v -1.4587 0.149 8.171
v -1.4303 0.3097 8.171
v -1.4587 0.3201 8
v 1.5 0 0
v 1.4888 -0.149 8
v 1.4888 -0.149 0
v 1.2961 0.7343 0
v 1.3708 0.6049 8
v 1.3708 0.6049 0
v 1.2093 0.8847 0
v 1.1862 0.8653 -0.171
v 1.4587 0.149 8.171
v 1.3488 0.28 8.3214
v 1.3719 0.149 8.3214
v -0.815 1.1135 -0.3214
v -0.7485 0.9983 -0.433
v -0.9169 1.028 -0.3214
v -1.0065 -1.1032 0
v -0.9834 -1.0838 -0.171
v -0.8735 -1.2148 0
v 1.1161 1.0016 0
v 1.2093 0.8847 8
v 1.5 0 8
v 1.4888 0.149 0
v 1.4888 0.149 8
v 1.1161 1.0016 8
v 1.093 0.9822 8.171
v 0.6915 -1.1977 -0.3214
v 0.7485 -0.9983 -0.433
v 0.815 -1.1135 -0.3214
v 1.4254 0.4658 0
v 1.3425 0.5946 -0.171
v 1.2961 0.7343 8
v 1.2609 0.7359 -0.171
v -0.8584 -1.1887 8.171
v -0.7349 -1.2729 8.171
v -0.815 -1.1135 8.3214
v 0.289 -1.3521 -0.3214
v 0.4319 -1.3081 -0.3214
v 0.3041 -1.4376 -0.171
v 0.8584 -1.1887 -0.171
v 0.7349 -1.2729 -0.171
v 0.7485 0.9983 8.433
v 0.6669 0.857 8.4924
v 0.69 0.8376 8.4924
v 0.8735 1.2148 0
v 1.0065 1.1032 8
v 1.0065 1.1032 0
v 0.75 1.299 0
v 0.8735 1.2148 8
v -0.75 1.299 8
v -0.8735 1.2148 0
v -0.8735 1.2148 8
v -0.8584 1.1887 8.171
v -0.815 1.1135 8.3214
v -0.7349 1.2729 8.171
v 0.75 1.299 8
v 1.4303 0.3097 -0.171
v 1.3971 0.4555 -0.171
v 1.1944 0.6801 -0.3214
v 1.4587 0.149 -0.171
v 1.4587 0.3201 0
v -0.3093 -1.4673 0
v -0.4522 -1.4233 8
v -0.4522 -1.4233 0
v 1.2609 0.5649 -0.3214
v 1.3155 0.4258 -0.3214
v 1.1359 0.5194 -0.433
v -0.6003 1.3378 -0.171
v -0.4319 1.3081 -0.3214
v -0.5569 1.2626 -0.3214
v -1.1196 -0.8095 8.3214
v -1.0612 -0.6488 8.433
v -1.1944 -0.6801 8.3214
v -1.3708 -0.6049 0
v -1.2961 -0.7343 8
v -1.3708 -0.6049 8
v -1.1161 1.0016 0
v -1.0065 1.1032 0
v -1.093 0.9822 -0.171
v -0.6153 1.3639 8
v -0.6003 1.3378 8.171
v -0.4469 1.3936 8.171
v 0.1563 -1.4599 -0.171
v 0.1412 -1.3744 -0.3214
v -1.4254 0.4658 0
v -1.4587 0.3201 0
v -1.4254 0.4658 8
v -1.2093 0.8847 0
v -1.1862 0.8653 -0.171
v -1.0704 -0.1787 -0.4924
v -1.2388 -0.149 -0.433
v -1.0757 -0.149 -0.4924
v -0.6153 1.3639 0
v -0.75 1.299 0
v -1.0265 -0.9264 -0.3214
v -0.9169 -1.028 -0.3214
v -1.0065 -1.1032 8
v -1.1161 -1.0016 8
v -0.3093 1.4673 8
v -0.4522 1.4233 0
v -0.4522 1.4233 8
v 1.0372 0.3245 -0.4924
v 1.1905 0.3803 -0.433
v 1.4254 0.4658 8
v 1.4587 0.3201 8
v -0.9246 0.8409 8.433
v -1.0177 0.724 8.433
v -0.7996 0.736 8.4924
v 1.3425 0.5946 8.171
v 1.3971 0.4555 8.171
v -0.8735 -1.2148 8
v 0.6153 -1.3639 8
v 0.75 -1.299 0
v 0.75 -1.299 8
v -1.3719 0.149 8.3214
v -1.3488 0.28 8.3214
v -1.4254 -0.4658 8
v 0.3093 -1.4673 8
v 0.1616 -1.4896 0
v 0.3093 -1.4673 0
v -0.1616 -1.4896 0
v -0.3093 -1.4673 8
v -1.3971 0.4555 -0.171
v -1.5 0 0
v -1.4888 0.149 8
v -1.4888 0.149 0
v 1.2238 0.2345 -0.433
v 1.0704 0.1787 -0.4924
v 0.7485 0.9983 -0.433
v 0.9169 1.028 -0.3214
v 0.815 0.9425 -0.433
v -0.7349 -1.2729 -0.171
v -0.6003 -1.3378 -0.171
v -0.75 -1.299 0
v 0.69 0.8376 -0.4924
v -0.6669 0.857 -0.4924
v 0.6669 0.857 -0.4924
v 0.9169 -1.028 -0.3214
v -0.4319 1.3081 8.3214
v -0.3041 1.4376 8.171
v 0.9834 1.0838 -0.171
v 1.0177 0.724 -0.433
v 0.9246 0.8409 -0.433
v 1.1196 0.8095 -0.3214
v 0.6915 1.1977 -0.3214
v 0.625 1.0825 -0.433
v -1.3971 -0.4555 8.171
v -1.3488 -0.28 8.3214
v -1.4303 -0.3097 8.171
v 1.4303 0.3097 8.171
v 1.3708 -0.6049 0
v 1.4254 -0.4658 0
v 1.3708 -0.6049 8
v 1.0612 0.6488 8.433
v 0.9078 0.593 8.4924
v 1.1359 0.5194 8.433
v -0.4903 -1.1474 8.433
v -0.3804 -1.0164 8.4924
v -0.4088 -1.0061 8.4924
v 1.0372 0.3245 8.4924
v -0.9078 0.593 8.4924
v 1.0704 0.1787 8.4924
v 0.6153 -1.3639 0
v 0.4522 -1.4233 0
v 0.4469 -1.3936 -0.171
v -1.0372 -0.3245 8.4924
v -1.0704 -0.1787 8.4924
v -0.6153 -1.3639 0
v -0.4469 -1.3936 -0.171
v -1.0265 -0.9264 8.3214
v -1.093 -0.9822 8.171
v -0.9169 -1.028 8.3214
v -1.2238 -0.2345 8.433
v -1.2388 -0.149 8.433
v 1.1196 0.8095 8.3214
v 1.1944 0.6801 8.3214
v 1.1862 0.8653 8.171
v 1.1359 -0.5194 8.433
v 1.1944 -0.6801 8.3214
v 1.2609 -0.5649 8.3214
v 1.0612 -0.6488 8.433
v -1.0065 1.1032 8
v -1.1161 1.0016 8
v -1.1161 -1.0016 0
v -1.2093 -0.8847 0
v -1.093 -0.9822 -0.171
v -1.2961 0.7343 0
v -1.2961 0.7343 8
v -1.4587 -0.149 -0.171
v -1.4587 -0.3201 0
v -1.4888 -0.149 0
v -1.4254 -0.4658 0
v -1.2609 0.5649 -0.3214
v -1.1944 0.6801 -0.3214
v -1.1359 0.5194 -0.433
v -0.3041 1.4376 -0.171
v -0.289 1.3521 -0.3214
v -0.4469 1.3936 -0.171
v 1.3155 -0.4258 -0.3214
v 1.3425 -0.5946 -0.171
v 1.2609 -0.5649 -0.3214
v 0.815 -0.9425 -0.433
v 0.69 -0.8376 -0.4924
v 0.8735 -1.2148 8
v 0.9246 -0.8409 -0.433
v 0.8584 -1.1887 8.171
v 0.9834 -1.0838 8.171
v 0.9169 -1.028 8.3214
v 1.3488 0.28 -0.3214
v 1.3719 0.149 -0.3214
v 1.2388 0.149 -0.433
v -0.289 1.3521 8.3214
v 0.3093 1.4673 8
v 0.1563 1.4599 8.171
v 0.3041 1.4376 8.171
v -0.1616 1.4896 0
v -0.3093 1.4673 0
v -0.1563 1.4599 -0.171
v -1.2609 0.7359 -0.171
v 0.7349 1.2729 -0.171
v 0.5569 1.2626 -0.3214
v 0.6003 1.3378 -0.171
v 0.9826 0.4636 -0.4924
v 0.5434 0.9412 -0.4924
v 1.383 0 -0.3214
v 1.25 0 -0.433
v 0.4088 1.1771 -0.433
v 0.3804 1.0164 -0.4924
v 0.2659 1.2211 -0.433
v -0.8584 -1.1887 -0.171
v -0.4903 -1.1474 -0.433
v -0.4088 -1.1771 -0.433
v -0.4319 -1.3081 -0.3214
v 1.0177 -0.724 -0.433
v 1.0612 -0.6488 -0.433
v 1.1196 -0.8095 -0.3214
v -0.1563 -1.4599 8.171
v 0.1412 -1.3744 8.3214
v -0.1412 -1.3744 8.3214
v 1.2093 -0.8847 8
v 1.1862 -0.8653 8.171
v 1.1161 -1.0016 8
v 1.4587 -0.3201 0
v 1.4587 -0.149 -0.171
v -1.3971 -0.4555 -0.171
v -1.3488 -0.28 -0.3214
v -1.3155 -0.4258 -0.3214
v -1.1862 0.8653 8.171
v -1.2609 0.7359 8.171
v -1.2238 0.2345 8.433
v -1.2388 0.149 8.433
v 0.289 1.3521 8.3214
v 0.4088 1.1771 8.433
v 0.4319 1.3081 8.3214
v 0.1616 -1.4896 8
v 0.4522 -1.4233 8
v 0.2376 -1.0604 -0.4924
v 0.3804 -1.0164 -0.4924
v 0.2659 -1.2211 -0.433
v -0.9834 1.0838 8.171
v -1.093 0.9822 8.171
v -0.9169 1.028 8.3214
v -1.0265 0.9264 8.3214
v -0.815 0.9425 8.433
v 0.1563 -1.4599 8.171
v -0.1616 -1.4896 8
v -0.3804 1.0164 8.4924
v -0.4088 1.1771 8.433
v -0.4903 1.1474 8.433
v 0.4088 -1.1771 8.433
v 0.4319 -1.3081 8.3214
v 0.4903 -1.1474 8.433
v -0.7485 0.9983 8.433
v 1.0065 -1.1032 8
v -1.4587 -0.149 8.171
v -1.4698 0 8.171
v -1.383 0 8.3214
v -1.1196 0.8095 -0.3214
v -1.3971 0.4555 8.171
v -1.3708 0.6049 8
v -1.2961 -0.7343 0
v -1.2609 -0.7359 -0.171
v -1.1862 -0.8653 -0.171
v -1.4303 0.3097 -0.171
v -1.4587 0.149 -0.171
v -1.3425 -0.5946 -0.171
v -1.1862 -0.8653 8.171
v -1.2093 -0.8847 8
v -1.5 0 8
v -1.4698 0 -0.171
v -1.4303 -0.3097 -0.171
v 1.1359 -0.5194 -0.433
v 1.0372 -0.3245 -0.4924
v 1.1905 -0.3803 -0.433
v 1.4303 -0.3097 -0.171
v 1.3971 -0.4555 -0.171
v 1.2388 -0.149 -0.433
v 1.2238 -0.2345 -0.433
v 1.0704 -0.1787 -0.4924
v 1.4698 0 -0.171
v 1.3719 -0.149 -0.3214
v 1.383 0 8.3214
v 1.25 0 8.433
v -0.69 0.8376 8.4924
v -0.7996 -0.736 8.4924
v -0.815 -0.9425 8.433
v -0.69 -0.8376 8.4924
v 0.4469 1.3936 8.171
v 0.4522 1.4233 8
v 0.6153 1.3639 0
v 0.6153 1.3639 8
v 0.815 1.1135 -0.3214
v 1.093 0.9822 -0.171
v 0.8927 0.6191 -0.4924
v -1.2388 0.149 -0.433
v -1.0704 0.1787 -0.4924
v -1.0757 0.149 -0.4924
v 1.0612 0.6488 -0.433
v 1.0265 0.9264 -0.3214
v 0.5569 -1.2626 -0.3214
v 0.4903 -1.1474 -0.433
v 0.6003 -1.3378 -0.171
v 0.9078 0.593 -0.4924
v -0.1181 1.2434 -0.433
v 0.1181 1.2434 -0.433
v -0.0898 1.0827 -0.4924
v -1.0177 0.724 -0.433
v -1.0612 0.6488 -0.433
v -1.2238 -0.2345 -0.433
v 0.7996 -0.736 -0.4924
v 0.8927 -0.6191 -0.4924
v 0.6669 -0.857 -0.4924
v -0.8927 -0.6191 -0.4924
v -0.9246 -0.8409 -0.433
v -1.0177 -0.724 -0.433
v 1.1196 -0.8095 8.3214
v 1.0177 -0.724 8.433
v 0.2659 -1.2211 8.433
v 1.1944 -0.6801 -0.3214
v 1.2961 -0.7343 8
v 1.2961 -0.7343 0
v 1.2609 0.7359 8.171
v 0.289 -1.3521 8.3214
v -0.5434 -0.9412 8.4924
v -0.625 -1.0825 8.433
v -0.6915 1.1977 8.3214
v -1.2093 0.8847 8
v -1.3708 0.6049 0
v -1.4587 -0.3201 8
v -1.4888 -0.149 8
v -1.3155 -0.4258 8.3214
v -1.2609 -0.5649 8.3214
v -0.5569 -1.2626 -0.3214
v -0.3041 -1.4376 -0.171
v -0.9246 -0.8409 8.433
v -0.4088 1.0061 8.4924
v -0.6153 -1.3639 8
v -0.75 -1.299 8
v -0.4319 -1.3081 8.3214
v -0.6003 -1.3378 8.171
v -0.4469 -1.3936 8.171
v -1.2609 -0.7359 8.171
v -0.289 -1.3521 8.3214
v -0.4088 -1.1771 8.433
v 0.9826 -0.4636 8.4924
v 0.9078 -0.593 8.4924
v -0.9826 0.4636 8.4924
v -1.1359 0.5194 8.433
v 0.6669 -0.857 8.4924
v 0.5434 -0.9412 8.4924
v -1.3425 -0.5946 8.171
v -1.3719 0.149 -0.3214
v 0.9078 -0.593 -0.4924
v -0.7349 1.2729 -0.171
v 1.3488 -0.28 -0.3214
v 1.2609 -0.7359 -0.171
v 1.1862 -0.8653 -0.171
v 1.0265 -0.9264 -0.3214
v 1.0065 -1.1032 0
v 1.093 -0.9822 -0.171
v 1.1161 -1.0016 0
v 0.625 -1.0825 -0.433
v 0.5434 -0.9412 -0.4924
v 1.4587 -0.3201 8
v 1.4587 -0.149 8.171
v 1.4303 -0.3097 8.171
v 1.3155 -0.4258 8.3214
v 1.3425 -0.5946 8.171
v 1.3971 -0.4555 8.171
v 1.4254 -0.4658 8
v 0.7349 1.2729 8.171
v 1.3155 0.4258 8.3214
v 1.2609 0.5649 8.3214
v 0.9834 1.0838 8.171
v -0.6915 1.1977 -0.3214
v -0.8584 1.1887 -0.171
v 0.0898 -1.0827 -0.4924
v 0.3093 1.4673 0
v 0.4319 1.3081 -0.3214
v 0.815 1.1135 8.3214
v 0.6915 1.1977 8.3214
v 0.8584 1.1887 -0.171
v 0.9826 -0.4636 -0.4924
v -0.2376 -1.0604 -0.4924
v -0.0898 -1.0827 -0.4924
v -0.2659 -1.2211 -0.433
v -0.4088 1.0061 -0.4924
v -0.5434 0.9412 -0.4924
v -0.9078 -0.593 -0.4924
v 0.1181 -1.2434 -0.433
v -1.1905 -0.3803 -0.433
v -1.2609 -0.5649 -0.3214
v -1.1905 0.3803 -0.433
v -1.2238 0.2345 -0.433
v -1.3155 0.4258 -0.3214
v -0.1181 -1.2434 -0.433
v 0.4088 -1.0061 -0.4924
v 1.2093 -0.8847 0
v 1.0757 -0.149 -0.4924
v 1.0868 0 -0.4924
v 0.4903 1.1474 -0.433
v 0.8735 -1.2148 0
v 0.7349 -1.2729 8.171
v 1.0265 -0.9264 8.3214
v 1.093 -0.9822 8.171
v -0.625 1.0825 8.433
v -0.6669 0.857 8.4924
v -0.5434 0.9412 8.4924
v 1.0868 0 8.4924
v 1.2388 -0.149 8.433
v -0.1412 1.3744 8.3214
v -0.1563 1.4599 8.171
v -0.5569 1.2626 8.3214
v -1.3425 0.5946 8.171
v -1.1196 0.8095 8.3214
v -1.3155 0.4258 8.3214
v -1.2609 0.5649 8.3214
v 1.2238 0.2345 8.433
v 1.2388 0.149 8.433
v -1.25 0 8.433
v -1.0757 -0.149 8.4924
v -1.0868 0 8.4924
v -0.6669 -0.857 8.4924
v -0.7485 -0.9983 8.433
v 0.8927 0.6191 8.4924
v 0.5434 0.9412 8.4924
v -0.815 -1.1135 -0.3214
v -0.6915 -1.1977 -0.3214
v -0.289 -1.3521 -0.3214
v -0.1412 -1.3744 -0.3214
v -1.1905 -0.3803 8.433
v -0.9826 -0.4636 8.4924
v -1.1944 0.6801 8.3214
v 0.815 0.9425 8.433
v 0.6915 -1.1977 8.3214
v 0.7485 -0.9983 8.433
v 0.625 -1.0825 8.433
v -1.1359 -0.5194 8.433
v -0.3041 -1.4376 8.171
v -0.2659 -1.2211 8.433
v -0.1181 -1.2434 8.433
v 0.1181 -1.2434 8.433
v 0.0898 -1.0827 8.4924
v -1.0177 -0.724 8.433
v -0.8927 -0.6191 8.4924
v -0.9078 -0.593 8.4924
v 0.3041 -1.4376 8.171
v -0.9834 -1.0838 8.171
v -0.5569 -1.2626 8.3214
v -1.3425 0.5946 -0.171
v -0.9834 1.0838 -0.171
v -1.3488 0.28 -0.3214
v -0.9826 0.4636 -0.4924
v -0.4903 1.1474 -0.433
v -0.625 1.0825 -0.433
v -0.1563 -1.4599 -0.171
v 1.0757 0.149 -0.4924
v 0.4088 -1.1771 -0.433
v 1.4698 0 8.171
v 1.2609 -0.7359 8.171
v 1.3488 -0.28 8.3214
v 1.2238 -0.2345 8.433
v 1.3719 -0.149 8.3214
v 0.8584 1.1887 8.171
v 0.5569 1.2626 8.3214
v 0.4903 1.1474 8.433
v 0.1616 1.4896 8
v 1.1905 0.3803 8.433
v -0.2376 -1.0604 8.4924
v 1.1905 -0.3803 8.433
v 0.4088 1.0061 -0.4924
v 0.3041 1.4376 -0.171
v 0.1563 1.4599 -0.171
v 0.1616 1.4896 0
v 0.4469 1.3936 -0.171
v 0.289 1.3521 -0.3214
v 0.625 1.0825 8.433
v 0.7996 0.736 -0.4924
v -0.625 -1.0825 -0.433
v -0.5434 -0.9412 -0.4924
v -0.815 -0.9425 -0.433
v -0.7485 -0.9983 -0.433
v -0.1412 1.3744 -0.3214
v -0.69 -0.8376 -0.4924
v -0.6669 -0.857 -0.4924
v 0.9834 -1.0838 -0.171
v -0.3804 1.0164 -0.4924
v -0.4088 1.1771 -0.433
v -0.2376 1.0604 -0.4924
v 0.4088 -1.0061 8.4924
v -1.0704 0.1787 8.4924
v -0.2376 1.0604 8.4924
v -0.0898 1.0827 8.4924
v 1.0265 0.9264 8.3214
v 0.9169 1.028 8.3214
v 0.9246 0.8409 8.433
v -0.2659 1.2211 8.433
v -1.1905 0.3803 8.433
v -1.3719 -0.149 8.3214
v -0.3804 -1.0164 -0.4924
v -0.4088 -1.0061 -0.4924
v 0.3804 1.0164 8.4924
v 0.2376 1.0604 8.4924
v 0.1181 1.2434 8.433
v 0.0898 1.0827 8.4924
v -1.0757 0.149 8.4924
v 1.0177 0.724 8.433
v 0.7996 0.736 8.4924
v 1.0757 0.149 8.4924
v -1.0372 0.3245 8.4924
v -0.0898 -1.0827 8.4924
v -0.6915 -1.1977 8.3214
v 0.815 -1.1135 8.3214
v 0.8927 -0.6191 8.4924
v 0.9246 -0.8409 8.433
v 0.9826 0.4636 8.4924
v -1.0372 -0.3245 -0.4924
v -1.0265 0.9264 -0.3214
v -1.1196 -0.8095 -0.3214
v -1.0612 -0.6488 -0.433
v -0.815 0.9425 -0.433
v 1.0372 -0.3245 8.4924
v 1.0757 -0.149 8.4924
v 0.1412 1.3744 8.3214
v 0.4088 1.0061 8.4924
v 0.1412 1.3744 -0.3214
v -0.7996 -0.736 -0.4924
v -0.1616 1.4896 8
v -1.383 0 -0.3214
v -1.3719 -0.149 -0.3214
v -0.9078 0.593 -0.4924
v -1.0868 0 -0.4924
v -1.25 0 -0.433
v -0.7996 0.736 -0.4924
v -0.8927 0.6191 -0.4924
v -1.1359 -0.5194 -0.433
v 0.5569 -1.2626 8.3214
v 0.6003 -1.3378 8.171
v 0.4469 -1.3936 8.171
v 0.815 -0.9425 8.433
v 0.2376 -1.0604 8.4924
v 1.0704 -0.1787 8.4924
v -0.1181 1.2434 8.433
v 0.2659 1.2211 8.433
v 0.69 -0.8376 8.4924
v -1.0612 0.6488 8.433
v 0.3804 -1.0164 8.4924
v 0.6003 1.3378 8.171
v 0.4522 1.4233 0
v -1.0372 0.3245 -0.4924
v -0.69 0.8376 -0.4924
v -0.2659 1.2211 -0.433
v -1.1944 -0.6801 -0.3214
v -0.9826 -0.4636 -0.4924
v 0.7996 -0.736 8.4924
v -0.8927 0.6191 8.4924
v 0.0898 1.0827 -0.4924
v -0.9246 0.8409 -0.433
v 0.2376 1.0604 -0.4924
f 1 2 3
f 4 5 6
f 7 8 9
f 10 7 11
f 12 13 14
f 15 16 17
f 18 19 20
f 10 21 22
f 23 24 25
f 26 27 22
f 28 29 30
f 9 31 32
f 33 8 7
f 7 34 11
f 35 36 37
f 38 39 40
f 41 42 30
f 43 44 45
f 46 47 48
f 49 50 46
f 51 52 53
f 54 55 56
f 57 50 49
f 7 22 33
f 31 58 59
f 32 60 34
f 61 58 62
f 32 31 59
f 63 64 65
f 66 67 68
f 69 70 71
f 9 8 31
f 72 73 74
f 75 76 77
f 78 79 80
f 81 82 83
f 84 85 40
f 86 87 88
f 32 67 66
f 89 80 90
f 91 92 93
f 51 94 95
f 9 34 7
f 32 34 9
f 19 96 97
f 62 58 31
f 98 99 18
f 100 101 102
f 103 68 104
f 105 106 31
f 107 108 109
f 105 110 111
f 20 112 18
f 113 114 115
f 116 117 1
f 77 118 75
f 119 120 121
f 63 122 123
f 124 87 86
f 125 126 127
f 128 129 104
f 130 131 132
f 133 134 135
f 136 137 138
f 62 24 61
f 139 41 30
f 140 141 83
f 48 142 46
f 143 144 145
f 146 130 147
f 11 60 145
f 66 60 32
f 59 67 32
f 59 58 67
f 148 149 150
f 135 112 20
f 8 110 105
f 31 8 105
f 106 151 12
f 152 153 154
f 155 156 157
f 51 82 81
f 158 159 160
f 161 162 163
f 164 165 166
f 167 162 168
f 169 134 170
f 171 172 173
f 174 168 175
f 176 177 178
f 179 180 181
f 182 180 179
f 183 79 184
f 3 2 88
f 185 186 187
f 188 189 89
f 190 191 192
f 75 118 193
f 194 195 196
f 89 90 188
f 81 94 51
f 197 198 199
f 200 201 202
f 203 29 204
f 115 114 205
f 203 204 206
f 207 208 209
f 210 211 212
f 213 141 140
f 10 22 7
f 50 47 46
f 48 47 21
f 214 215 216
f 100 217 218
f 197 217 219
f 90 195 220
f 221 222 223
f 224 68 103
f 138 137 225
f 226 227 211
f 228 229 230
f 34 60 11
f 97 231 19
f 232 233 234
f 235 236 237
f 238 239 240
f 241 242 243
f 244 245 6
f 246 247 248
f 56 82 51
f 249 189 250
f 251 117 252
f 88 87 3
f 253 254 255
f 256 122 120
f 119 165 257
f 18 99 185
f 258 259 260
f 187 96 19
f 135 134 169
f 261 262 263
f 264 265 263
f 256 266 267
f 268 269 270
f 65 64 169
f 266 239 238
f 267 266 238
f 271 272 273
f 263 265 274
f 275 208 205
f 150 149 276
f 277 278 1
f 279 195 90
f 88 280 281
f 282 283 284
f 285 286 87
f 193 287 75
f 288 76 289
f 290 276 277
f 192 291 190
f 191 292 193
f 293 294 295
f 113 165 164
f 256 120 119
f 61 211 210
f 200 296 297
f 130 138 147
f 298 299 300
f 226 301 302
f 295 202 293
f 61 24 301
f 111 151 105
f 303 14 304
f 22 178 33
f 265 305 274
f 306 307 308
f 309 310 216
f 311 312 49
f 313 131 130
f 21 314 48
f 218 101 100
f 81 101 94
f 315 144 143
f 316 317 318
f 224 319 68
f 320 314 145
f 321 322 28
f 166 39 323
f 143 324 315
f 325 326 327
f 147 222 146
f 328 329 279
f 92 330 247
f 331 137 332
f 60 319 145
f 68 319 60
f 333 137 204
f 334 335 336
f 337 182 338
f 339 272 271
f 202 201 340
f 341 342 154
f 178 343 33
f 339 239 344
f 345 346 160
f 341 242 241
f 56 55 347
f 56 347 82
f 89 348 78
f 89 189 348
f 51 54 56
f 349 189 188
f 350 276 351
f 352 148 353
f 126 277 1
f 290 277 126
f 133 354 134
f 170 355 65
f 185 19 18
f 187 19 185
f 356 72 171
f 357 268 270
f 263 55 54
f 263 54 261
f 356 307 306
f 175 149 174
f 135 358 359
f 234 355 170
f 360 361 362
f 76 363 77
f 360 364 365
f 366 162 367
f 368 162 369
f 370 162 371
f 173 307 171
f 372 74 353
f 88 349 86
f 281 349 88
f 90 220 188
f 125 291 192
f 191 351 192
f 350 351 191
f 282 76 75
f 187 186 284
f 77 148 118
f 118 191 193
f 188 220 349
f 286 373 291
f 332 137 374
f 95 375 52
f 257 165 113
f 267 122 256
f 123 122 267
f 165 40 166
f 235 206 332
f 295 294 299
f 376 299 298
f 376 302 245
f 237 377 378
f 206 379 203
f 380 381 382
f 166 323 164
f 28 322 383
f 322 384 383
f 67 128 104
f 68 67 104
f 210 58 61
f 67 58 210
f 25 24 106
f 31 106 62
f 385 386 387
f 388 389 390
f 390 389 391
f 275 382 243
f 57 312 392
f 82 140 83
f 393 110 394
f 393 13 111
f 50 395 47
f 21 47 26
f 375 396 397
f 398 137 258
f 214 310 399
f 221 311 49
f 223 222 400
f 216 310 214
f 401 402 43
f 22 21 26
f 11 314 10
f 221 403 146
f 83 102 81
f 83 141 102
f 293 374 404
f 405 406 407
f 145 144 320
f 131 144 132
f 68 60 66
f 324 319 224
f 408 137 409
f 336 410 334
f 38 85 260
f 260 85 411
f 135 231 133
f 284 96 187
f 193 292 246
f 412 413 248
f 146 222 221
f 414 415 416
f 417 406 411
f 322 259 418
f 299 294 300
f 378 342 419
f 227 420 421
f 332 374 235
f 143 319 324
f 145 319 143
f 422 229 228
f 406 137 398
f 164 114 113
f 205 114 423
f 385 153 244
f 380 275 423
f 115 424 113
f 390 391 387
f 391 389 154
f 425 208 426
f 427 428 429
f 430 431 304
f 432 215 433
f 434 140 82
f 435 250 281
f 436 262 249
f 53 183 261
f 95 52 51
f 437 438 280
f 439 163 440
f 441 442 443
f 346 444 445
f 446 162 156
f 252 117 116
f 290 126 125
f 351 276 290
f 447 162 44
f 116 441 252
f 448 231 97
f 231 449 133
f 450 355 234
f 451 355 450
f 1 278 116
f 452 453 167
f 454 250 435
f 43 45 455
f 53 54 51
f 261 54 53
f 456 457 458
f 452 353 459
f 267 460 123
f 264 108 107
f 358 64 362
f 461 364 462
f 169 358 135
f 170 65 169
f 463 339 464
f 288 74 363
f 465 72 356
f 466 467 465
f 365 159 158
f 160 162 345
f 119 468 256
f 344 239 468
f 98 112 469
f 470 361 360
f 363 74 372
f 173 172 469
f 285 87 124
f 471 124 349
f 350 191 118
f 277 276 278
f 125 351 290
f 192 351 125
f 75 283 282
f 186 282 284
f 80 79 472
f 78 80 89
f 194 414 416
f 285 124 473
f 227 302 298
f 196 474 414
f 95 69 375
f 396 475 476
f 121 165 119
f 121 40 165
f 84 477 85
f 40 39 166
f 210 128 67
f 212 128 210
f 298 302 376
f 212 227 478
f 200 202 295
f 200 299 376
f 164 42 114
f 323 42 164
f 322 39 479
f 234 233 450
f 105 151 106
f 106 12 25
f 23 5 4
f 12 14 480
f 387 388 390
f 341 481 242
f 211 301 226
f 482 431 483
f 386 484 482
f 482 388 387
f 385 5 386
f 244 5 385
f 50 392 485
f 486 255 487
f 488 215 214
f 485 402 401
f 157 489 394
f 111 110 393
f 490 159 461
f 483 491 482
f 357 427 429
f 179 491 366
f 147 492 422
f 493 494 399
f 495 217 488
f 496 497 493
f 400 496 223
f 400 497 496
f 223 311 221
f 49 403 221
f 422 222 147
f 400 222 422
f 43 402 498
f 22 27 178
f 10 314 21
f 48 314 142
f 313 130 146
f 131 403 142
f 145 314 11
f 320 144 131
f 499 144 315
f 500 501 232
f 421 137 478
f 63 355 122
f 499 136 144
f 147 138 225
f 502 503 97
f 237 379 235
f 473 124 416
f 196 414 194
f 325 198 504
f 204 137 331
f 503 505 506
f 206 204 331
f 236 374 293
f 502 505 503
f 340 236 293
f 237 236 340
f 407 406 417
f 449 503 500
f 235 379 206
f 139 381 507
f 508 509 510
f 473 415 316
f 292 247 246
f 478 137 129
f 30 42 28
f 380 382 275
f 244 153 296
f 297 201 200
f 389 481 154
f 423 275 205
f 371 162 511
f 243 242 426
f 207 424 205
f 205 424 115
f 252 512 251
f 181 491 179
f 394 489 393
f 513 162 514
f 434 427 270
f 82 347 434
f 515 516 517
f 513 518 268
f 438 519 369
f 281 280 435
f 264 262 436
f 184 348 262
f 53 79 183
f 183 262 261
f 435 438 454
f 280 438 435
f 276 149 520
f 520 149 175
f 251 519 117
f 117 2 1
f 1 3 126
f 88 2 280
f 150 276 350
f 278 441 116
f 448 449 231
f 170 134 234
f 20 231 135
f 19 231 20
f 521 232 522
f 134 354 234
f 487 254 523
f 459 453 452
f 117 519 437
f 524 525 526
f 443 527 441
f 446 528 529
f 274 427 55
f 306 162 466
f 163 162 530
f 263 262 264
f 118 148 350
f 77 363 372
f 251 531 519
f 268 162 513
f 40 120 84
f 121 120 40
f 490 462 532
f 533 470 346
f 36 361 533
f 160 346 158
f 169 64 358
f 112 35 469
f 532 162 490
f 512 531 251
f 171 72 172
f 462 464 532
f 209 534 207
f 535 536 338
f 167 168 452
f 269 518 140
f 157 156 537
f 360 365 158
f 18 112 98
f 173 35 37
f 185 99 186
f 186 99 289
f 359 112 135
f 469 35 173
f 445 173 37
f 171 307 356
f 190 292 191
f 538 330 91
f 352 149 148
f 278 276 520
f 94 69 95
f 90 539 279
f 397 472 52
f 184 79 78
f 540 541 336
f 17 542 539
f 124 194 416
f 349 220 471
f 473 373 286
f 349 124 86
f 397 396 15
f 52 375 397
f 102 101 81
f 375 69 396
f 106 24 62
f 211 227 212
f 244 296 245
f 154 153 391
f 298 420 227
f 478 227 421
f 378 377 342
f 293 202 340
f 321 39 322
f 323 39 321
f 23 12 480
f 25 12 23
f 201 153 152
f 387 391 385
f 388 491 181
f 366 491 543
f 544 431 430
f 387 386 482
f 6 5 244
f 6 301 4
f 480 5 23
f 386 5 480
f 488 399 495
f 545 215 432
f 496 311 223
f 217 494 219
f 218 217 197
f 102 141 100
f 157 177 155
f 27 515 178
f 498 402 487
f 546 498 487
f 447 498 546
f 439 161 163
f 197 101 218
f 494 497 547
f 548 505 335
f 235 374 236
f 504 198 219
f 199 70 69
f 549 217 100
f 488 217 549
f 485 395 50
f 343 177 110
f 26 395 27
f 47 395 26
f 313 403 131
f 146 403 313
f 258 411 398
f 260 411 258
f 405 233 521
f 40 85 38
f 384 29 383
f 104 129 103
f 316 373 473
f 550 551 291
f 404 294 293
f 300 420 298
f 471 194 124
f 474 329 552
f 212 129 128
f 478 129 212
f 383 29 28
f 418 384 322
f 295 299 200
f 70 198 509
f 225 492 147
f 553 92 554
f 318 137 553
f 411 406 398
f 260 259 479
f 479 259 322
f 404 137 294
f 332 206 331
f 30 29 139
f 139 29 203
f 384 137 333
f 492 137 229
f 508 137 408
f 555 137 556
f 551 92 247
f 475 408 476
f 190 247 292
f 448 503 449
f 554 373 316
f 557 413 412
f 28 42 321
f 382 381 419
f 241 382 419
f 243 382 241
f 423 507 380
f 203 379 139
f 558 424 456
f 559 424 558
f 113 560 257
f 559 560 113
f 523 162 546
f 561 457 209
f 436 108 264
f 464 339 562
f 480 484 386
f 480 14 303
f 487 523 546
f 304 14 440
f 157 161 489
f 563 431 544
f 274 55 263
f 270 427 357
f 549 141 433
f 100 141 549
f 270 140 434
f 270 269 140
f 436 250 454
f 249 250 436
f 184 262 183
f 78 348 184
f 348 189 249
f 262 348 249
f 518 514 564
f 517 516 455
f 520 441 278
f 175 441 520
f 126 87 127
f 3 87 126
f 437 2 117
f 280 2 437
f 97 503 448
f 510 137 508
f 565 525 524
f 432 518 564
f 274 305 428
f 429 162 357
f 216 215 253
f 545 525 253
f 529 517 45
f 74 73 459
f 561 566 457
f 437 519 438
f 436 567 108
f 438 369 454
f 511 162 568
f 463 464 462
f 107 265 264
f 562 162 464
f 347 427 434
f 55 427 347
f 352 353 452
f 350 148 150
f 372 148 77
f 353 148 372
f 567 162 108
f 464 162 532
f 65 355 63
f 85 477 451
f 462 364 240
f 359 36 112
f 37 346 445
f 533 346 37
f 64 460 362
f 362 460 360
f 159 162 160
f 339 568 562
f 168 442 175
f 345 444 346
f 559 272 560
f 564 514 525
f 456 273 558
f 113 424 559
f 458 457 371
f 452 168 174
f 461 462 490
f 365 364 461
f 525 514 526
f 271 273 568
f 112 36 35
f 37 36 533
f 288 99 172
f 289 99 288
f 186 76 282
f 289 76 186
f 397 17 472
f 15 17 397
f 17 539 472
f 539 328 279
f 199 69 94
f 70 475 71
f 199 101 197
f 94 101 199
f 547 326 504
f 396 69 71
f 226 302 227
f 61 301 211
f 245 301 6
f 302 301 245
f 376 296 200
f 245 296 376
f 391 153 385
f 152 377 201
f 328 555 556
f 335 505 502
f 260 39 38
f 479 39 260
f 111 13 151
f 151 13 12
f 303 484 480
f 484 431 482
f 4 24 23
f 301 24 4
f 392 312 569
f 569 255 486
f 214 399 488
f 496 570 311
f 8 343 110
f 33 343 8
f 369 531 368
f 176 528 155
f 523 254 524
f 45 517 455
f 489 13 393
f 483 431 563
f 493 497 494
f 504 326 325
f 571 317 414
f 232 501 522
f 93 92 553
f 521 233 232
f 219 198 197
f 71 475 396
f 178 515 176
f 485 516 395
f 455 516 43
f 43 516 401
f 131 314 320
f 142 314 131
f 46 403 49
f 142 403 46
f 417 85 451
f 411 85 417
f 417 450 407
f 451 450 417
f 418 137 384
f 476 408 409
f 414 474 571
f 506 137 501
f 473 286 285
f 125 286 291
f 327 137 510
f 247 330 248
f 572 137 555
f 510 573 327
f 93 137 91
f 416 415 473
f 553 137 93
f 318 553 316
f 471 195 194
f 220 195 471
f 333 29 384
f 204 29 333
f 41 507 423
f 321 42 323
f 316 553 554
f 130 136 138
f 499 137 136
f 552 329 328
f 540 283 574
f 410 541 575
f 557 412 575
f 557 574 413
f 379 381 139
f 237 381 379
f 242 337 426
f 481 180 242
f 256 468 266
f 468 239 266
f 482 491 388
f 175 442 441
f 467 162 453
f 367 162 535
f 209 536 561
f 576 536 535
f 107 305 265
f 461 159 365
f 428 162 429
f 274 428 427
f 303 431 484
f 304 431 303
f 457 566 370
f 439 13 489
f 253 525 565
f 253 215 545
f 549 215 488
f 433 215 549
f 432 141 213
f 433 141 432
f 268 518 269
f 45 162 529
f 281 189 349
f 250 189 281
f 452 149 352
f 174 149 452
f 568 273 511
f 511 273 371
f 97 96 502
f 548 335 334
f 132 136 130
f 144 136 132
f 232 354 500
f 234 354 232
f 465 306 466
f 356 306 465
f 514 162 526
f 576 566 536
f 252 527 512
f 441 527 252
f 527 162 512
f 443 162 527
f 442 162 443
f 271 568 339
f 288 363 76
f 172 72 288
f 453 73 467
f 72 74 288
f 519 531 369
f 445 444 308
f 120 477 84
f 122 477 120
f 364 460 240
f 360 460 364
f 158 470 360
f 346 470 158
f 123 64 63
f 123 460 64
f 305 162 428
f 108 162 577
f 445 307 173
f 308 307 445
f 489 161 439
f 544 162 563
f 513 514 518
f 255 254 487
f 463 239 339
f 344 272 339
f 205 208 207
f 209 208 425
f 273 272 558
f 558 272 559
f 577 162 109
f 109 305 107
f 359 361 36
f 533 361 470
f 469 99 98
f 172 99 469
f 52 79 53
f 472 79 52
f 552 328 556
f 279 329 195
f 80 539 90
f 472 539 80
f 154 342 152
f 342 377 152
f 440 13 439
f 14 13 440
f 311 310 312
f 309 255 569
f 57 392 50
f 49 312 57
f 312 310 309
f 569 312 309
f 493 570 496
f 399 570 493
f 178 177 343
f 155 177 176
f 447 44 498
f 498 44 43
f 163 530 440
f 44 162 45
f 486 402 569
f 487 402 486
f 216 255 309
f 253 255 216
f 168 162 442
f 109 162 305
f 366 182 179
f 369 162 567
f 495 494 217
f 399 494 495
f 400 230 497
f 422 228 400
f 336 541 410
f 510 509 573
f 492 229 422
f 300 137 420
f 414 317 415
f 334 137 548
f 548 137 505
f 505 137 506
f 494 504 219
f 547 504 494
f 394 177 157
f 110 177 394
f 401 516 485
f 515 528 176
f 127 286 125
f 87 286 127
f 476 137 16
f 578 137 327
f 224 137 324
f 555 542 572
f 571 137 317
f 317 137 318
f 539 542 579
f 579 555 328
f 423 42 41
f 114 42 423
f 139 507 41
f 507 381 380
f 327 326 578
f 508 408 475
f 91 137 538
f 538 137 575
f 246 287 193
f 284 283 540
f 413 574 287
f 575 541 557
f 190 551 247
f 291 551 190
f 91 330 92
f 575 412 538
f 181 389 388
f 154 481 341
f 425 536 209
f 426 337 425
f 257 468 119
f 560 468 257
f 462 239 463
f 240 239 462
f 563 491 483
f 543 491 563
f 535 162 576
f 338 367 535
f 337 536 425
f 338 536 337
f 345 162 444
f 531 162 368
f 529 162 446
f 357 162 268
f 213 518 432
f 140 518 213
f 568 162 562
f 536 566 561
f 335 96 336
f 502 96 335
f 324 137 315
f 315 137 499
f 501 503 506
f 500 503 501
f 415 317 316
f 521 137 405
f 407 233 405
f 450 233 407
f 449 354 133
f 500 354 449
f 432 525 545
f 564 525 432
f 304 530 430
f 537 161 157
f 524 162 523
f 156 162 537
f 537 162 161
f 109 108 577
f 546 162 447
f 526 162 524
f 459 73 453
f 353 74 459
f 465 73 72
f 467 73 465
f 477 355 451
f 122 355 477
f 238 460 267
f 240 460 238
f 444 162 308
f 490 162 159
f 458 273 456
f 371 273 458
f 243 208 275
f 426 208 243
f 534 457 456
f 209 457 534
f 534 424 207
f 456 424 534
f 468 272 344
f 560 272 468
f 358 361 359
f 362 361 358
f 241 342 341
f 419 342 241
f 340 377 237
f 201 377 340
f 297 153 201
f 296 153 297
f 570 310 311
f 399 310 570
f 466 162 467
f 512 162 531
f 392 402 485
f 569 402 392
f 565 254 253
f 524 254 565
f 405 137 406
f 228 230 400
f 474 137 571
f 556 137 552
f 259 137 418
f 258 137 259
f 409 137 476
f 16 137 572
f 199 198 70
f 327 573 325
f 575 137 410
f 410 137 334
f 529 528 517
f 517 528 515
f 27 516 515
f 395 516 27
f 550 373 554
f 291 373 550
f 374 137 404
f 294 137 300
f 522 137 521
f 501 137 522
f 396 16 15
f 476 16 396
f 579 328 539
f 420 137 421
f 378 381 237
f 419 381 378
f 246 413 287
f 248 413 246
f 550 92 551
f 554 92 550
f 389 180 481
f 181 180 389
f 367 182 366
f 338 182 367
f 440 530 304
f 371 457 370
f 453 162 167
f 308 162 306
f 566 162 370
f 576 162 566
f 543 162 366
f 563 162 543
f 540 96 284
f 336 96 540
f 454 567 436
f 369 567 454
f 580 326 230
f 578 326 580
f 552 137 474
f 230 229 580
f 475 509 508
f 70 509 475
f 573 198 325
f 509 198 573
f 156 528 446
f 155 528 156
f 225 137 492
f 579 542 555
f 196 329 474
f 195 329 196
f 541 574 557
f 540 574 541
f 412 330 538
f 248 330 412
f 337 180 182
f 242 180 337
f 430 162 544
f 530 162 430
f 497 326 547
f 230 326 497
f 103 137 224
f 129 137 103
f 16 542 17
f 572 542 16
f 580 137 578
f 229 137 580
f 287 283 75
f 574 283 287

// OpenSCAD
// part_id: b12
// name: B12 pin
// source_drawing_ids: DRW-002
// units: mm
// revision: 0.1
// SPDX-License-Identifier: MIT

module part_b12(d = 3.0, h = 9.0, edge_r = 0.5) {
    // Slightly softened cylinder for press/rivet pin visual.
    minkowski() {
        cylinder(d = d - 2 * edge_r, h = h - 2 * edge_r, center = false, $fn = 42);
        sphere(r = edge_r, $fn = 18);
    }
}

// ---- "main guard" ----
// Default to previewing when opened directly:
if (is_undef(__LIB_MODE__)) {
    part_b12();
}
